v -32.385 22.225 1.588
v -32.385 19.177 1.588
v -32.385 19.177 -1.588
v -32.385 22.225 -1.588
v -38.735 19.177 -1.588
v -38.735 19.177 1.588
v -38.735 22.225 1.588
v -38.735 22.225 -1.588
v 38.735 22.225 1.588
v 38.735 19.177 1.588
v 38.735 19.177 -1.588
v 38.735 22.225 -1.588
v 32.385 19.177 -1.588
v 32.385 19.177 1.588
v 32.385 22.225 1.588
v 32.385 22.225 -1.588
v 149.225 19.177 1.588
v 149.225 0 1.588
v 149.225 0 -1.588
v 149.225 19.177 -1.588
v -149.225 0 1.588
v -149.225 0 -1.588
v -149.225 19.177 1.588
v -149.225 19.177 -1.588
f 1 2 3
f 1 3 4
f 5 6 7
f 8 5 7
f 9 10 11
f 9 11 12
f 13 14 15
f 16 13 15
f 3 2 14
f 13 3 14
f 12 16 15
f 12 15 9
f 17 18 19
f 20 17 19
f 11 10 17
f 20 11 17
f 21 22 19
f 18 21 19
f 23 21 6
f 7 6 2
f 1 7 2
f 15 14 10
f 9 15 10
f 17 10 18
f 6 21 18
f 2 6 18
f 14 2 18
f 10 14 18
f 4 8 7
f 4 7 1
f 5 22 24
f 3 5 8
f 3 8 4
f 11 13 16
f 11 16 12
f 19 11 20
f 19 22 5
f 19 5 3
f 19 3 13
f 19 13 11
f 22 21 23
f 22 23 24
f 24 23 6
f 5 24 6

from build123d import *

# Parameters (mm, degrees)
SKETCH1_W           = 298.45
SKETCH1_H           = 3.175
BOSS_EXTRUDE1_DEPTH = 22.225
SKETCH2_W           = 110.49
SKETCH2_H           = 3.048
SKETCH2_W_2         = 64.77
CUT_EXTRUDE1_DEPTH  = 151.904379907


with BuildPart() as part:
    # Sketch1 → Boss-Extrude1 (new body)
    with BuildSketch(Plane(origin=(0, 0, 0), x_dir=(1, 0, 0), z_dir=(0, 1, 0))):
        Rectangle(SKETCH1_W, SKETCH1_H)
    extrude(amount=BOSS_EXTRUDE1_DEPTH)

    # Sketch2 → Cut-Extrude1 (cut, through all)
    with BuildSketch(Plane.XY.offset(1.5875)):
        with Locations((-93.98, 20.701)):
            Rectangle(SKETCH2_W, SKETCH2_H)
        with Locations((93.98, 20.701)):
            Rectangle(SKETCH2_W, SKETCH2_H)
        with Locations((0, 20.701)):
            Rectangle(SKETCH2_W_2, SKETCH2_H)
    extrude(amount=-CUT_EXTRUDE1_DEPTH, mode=Mode.SUBTRACT)


solid = part.part
